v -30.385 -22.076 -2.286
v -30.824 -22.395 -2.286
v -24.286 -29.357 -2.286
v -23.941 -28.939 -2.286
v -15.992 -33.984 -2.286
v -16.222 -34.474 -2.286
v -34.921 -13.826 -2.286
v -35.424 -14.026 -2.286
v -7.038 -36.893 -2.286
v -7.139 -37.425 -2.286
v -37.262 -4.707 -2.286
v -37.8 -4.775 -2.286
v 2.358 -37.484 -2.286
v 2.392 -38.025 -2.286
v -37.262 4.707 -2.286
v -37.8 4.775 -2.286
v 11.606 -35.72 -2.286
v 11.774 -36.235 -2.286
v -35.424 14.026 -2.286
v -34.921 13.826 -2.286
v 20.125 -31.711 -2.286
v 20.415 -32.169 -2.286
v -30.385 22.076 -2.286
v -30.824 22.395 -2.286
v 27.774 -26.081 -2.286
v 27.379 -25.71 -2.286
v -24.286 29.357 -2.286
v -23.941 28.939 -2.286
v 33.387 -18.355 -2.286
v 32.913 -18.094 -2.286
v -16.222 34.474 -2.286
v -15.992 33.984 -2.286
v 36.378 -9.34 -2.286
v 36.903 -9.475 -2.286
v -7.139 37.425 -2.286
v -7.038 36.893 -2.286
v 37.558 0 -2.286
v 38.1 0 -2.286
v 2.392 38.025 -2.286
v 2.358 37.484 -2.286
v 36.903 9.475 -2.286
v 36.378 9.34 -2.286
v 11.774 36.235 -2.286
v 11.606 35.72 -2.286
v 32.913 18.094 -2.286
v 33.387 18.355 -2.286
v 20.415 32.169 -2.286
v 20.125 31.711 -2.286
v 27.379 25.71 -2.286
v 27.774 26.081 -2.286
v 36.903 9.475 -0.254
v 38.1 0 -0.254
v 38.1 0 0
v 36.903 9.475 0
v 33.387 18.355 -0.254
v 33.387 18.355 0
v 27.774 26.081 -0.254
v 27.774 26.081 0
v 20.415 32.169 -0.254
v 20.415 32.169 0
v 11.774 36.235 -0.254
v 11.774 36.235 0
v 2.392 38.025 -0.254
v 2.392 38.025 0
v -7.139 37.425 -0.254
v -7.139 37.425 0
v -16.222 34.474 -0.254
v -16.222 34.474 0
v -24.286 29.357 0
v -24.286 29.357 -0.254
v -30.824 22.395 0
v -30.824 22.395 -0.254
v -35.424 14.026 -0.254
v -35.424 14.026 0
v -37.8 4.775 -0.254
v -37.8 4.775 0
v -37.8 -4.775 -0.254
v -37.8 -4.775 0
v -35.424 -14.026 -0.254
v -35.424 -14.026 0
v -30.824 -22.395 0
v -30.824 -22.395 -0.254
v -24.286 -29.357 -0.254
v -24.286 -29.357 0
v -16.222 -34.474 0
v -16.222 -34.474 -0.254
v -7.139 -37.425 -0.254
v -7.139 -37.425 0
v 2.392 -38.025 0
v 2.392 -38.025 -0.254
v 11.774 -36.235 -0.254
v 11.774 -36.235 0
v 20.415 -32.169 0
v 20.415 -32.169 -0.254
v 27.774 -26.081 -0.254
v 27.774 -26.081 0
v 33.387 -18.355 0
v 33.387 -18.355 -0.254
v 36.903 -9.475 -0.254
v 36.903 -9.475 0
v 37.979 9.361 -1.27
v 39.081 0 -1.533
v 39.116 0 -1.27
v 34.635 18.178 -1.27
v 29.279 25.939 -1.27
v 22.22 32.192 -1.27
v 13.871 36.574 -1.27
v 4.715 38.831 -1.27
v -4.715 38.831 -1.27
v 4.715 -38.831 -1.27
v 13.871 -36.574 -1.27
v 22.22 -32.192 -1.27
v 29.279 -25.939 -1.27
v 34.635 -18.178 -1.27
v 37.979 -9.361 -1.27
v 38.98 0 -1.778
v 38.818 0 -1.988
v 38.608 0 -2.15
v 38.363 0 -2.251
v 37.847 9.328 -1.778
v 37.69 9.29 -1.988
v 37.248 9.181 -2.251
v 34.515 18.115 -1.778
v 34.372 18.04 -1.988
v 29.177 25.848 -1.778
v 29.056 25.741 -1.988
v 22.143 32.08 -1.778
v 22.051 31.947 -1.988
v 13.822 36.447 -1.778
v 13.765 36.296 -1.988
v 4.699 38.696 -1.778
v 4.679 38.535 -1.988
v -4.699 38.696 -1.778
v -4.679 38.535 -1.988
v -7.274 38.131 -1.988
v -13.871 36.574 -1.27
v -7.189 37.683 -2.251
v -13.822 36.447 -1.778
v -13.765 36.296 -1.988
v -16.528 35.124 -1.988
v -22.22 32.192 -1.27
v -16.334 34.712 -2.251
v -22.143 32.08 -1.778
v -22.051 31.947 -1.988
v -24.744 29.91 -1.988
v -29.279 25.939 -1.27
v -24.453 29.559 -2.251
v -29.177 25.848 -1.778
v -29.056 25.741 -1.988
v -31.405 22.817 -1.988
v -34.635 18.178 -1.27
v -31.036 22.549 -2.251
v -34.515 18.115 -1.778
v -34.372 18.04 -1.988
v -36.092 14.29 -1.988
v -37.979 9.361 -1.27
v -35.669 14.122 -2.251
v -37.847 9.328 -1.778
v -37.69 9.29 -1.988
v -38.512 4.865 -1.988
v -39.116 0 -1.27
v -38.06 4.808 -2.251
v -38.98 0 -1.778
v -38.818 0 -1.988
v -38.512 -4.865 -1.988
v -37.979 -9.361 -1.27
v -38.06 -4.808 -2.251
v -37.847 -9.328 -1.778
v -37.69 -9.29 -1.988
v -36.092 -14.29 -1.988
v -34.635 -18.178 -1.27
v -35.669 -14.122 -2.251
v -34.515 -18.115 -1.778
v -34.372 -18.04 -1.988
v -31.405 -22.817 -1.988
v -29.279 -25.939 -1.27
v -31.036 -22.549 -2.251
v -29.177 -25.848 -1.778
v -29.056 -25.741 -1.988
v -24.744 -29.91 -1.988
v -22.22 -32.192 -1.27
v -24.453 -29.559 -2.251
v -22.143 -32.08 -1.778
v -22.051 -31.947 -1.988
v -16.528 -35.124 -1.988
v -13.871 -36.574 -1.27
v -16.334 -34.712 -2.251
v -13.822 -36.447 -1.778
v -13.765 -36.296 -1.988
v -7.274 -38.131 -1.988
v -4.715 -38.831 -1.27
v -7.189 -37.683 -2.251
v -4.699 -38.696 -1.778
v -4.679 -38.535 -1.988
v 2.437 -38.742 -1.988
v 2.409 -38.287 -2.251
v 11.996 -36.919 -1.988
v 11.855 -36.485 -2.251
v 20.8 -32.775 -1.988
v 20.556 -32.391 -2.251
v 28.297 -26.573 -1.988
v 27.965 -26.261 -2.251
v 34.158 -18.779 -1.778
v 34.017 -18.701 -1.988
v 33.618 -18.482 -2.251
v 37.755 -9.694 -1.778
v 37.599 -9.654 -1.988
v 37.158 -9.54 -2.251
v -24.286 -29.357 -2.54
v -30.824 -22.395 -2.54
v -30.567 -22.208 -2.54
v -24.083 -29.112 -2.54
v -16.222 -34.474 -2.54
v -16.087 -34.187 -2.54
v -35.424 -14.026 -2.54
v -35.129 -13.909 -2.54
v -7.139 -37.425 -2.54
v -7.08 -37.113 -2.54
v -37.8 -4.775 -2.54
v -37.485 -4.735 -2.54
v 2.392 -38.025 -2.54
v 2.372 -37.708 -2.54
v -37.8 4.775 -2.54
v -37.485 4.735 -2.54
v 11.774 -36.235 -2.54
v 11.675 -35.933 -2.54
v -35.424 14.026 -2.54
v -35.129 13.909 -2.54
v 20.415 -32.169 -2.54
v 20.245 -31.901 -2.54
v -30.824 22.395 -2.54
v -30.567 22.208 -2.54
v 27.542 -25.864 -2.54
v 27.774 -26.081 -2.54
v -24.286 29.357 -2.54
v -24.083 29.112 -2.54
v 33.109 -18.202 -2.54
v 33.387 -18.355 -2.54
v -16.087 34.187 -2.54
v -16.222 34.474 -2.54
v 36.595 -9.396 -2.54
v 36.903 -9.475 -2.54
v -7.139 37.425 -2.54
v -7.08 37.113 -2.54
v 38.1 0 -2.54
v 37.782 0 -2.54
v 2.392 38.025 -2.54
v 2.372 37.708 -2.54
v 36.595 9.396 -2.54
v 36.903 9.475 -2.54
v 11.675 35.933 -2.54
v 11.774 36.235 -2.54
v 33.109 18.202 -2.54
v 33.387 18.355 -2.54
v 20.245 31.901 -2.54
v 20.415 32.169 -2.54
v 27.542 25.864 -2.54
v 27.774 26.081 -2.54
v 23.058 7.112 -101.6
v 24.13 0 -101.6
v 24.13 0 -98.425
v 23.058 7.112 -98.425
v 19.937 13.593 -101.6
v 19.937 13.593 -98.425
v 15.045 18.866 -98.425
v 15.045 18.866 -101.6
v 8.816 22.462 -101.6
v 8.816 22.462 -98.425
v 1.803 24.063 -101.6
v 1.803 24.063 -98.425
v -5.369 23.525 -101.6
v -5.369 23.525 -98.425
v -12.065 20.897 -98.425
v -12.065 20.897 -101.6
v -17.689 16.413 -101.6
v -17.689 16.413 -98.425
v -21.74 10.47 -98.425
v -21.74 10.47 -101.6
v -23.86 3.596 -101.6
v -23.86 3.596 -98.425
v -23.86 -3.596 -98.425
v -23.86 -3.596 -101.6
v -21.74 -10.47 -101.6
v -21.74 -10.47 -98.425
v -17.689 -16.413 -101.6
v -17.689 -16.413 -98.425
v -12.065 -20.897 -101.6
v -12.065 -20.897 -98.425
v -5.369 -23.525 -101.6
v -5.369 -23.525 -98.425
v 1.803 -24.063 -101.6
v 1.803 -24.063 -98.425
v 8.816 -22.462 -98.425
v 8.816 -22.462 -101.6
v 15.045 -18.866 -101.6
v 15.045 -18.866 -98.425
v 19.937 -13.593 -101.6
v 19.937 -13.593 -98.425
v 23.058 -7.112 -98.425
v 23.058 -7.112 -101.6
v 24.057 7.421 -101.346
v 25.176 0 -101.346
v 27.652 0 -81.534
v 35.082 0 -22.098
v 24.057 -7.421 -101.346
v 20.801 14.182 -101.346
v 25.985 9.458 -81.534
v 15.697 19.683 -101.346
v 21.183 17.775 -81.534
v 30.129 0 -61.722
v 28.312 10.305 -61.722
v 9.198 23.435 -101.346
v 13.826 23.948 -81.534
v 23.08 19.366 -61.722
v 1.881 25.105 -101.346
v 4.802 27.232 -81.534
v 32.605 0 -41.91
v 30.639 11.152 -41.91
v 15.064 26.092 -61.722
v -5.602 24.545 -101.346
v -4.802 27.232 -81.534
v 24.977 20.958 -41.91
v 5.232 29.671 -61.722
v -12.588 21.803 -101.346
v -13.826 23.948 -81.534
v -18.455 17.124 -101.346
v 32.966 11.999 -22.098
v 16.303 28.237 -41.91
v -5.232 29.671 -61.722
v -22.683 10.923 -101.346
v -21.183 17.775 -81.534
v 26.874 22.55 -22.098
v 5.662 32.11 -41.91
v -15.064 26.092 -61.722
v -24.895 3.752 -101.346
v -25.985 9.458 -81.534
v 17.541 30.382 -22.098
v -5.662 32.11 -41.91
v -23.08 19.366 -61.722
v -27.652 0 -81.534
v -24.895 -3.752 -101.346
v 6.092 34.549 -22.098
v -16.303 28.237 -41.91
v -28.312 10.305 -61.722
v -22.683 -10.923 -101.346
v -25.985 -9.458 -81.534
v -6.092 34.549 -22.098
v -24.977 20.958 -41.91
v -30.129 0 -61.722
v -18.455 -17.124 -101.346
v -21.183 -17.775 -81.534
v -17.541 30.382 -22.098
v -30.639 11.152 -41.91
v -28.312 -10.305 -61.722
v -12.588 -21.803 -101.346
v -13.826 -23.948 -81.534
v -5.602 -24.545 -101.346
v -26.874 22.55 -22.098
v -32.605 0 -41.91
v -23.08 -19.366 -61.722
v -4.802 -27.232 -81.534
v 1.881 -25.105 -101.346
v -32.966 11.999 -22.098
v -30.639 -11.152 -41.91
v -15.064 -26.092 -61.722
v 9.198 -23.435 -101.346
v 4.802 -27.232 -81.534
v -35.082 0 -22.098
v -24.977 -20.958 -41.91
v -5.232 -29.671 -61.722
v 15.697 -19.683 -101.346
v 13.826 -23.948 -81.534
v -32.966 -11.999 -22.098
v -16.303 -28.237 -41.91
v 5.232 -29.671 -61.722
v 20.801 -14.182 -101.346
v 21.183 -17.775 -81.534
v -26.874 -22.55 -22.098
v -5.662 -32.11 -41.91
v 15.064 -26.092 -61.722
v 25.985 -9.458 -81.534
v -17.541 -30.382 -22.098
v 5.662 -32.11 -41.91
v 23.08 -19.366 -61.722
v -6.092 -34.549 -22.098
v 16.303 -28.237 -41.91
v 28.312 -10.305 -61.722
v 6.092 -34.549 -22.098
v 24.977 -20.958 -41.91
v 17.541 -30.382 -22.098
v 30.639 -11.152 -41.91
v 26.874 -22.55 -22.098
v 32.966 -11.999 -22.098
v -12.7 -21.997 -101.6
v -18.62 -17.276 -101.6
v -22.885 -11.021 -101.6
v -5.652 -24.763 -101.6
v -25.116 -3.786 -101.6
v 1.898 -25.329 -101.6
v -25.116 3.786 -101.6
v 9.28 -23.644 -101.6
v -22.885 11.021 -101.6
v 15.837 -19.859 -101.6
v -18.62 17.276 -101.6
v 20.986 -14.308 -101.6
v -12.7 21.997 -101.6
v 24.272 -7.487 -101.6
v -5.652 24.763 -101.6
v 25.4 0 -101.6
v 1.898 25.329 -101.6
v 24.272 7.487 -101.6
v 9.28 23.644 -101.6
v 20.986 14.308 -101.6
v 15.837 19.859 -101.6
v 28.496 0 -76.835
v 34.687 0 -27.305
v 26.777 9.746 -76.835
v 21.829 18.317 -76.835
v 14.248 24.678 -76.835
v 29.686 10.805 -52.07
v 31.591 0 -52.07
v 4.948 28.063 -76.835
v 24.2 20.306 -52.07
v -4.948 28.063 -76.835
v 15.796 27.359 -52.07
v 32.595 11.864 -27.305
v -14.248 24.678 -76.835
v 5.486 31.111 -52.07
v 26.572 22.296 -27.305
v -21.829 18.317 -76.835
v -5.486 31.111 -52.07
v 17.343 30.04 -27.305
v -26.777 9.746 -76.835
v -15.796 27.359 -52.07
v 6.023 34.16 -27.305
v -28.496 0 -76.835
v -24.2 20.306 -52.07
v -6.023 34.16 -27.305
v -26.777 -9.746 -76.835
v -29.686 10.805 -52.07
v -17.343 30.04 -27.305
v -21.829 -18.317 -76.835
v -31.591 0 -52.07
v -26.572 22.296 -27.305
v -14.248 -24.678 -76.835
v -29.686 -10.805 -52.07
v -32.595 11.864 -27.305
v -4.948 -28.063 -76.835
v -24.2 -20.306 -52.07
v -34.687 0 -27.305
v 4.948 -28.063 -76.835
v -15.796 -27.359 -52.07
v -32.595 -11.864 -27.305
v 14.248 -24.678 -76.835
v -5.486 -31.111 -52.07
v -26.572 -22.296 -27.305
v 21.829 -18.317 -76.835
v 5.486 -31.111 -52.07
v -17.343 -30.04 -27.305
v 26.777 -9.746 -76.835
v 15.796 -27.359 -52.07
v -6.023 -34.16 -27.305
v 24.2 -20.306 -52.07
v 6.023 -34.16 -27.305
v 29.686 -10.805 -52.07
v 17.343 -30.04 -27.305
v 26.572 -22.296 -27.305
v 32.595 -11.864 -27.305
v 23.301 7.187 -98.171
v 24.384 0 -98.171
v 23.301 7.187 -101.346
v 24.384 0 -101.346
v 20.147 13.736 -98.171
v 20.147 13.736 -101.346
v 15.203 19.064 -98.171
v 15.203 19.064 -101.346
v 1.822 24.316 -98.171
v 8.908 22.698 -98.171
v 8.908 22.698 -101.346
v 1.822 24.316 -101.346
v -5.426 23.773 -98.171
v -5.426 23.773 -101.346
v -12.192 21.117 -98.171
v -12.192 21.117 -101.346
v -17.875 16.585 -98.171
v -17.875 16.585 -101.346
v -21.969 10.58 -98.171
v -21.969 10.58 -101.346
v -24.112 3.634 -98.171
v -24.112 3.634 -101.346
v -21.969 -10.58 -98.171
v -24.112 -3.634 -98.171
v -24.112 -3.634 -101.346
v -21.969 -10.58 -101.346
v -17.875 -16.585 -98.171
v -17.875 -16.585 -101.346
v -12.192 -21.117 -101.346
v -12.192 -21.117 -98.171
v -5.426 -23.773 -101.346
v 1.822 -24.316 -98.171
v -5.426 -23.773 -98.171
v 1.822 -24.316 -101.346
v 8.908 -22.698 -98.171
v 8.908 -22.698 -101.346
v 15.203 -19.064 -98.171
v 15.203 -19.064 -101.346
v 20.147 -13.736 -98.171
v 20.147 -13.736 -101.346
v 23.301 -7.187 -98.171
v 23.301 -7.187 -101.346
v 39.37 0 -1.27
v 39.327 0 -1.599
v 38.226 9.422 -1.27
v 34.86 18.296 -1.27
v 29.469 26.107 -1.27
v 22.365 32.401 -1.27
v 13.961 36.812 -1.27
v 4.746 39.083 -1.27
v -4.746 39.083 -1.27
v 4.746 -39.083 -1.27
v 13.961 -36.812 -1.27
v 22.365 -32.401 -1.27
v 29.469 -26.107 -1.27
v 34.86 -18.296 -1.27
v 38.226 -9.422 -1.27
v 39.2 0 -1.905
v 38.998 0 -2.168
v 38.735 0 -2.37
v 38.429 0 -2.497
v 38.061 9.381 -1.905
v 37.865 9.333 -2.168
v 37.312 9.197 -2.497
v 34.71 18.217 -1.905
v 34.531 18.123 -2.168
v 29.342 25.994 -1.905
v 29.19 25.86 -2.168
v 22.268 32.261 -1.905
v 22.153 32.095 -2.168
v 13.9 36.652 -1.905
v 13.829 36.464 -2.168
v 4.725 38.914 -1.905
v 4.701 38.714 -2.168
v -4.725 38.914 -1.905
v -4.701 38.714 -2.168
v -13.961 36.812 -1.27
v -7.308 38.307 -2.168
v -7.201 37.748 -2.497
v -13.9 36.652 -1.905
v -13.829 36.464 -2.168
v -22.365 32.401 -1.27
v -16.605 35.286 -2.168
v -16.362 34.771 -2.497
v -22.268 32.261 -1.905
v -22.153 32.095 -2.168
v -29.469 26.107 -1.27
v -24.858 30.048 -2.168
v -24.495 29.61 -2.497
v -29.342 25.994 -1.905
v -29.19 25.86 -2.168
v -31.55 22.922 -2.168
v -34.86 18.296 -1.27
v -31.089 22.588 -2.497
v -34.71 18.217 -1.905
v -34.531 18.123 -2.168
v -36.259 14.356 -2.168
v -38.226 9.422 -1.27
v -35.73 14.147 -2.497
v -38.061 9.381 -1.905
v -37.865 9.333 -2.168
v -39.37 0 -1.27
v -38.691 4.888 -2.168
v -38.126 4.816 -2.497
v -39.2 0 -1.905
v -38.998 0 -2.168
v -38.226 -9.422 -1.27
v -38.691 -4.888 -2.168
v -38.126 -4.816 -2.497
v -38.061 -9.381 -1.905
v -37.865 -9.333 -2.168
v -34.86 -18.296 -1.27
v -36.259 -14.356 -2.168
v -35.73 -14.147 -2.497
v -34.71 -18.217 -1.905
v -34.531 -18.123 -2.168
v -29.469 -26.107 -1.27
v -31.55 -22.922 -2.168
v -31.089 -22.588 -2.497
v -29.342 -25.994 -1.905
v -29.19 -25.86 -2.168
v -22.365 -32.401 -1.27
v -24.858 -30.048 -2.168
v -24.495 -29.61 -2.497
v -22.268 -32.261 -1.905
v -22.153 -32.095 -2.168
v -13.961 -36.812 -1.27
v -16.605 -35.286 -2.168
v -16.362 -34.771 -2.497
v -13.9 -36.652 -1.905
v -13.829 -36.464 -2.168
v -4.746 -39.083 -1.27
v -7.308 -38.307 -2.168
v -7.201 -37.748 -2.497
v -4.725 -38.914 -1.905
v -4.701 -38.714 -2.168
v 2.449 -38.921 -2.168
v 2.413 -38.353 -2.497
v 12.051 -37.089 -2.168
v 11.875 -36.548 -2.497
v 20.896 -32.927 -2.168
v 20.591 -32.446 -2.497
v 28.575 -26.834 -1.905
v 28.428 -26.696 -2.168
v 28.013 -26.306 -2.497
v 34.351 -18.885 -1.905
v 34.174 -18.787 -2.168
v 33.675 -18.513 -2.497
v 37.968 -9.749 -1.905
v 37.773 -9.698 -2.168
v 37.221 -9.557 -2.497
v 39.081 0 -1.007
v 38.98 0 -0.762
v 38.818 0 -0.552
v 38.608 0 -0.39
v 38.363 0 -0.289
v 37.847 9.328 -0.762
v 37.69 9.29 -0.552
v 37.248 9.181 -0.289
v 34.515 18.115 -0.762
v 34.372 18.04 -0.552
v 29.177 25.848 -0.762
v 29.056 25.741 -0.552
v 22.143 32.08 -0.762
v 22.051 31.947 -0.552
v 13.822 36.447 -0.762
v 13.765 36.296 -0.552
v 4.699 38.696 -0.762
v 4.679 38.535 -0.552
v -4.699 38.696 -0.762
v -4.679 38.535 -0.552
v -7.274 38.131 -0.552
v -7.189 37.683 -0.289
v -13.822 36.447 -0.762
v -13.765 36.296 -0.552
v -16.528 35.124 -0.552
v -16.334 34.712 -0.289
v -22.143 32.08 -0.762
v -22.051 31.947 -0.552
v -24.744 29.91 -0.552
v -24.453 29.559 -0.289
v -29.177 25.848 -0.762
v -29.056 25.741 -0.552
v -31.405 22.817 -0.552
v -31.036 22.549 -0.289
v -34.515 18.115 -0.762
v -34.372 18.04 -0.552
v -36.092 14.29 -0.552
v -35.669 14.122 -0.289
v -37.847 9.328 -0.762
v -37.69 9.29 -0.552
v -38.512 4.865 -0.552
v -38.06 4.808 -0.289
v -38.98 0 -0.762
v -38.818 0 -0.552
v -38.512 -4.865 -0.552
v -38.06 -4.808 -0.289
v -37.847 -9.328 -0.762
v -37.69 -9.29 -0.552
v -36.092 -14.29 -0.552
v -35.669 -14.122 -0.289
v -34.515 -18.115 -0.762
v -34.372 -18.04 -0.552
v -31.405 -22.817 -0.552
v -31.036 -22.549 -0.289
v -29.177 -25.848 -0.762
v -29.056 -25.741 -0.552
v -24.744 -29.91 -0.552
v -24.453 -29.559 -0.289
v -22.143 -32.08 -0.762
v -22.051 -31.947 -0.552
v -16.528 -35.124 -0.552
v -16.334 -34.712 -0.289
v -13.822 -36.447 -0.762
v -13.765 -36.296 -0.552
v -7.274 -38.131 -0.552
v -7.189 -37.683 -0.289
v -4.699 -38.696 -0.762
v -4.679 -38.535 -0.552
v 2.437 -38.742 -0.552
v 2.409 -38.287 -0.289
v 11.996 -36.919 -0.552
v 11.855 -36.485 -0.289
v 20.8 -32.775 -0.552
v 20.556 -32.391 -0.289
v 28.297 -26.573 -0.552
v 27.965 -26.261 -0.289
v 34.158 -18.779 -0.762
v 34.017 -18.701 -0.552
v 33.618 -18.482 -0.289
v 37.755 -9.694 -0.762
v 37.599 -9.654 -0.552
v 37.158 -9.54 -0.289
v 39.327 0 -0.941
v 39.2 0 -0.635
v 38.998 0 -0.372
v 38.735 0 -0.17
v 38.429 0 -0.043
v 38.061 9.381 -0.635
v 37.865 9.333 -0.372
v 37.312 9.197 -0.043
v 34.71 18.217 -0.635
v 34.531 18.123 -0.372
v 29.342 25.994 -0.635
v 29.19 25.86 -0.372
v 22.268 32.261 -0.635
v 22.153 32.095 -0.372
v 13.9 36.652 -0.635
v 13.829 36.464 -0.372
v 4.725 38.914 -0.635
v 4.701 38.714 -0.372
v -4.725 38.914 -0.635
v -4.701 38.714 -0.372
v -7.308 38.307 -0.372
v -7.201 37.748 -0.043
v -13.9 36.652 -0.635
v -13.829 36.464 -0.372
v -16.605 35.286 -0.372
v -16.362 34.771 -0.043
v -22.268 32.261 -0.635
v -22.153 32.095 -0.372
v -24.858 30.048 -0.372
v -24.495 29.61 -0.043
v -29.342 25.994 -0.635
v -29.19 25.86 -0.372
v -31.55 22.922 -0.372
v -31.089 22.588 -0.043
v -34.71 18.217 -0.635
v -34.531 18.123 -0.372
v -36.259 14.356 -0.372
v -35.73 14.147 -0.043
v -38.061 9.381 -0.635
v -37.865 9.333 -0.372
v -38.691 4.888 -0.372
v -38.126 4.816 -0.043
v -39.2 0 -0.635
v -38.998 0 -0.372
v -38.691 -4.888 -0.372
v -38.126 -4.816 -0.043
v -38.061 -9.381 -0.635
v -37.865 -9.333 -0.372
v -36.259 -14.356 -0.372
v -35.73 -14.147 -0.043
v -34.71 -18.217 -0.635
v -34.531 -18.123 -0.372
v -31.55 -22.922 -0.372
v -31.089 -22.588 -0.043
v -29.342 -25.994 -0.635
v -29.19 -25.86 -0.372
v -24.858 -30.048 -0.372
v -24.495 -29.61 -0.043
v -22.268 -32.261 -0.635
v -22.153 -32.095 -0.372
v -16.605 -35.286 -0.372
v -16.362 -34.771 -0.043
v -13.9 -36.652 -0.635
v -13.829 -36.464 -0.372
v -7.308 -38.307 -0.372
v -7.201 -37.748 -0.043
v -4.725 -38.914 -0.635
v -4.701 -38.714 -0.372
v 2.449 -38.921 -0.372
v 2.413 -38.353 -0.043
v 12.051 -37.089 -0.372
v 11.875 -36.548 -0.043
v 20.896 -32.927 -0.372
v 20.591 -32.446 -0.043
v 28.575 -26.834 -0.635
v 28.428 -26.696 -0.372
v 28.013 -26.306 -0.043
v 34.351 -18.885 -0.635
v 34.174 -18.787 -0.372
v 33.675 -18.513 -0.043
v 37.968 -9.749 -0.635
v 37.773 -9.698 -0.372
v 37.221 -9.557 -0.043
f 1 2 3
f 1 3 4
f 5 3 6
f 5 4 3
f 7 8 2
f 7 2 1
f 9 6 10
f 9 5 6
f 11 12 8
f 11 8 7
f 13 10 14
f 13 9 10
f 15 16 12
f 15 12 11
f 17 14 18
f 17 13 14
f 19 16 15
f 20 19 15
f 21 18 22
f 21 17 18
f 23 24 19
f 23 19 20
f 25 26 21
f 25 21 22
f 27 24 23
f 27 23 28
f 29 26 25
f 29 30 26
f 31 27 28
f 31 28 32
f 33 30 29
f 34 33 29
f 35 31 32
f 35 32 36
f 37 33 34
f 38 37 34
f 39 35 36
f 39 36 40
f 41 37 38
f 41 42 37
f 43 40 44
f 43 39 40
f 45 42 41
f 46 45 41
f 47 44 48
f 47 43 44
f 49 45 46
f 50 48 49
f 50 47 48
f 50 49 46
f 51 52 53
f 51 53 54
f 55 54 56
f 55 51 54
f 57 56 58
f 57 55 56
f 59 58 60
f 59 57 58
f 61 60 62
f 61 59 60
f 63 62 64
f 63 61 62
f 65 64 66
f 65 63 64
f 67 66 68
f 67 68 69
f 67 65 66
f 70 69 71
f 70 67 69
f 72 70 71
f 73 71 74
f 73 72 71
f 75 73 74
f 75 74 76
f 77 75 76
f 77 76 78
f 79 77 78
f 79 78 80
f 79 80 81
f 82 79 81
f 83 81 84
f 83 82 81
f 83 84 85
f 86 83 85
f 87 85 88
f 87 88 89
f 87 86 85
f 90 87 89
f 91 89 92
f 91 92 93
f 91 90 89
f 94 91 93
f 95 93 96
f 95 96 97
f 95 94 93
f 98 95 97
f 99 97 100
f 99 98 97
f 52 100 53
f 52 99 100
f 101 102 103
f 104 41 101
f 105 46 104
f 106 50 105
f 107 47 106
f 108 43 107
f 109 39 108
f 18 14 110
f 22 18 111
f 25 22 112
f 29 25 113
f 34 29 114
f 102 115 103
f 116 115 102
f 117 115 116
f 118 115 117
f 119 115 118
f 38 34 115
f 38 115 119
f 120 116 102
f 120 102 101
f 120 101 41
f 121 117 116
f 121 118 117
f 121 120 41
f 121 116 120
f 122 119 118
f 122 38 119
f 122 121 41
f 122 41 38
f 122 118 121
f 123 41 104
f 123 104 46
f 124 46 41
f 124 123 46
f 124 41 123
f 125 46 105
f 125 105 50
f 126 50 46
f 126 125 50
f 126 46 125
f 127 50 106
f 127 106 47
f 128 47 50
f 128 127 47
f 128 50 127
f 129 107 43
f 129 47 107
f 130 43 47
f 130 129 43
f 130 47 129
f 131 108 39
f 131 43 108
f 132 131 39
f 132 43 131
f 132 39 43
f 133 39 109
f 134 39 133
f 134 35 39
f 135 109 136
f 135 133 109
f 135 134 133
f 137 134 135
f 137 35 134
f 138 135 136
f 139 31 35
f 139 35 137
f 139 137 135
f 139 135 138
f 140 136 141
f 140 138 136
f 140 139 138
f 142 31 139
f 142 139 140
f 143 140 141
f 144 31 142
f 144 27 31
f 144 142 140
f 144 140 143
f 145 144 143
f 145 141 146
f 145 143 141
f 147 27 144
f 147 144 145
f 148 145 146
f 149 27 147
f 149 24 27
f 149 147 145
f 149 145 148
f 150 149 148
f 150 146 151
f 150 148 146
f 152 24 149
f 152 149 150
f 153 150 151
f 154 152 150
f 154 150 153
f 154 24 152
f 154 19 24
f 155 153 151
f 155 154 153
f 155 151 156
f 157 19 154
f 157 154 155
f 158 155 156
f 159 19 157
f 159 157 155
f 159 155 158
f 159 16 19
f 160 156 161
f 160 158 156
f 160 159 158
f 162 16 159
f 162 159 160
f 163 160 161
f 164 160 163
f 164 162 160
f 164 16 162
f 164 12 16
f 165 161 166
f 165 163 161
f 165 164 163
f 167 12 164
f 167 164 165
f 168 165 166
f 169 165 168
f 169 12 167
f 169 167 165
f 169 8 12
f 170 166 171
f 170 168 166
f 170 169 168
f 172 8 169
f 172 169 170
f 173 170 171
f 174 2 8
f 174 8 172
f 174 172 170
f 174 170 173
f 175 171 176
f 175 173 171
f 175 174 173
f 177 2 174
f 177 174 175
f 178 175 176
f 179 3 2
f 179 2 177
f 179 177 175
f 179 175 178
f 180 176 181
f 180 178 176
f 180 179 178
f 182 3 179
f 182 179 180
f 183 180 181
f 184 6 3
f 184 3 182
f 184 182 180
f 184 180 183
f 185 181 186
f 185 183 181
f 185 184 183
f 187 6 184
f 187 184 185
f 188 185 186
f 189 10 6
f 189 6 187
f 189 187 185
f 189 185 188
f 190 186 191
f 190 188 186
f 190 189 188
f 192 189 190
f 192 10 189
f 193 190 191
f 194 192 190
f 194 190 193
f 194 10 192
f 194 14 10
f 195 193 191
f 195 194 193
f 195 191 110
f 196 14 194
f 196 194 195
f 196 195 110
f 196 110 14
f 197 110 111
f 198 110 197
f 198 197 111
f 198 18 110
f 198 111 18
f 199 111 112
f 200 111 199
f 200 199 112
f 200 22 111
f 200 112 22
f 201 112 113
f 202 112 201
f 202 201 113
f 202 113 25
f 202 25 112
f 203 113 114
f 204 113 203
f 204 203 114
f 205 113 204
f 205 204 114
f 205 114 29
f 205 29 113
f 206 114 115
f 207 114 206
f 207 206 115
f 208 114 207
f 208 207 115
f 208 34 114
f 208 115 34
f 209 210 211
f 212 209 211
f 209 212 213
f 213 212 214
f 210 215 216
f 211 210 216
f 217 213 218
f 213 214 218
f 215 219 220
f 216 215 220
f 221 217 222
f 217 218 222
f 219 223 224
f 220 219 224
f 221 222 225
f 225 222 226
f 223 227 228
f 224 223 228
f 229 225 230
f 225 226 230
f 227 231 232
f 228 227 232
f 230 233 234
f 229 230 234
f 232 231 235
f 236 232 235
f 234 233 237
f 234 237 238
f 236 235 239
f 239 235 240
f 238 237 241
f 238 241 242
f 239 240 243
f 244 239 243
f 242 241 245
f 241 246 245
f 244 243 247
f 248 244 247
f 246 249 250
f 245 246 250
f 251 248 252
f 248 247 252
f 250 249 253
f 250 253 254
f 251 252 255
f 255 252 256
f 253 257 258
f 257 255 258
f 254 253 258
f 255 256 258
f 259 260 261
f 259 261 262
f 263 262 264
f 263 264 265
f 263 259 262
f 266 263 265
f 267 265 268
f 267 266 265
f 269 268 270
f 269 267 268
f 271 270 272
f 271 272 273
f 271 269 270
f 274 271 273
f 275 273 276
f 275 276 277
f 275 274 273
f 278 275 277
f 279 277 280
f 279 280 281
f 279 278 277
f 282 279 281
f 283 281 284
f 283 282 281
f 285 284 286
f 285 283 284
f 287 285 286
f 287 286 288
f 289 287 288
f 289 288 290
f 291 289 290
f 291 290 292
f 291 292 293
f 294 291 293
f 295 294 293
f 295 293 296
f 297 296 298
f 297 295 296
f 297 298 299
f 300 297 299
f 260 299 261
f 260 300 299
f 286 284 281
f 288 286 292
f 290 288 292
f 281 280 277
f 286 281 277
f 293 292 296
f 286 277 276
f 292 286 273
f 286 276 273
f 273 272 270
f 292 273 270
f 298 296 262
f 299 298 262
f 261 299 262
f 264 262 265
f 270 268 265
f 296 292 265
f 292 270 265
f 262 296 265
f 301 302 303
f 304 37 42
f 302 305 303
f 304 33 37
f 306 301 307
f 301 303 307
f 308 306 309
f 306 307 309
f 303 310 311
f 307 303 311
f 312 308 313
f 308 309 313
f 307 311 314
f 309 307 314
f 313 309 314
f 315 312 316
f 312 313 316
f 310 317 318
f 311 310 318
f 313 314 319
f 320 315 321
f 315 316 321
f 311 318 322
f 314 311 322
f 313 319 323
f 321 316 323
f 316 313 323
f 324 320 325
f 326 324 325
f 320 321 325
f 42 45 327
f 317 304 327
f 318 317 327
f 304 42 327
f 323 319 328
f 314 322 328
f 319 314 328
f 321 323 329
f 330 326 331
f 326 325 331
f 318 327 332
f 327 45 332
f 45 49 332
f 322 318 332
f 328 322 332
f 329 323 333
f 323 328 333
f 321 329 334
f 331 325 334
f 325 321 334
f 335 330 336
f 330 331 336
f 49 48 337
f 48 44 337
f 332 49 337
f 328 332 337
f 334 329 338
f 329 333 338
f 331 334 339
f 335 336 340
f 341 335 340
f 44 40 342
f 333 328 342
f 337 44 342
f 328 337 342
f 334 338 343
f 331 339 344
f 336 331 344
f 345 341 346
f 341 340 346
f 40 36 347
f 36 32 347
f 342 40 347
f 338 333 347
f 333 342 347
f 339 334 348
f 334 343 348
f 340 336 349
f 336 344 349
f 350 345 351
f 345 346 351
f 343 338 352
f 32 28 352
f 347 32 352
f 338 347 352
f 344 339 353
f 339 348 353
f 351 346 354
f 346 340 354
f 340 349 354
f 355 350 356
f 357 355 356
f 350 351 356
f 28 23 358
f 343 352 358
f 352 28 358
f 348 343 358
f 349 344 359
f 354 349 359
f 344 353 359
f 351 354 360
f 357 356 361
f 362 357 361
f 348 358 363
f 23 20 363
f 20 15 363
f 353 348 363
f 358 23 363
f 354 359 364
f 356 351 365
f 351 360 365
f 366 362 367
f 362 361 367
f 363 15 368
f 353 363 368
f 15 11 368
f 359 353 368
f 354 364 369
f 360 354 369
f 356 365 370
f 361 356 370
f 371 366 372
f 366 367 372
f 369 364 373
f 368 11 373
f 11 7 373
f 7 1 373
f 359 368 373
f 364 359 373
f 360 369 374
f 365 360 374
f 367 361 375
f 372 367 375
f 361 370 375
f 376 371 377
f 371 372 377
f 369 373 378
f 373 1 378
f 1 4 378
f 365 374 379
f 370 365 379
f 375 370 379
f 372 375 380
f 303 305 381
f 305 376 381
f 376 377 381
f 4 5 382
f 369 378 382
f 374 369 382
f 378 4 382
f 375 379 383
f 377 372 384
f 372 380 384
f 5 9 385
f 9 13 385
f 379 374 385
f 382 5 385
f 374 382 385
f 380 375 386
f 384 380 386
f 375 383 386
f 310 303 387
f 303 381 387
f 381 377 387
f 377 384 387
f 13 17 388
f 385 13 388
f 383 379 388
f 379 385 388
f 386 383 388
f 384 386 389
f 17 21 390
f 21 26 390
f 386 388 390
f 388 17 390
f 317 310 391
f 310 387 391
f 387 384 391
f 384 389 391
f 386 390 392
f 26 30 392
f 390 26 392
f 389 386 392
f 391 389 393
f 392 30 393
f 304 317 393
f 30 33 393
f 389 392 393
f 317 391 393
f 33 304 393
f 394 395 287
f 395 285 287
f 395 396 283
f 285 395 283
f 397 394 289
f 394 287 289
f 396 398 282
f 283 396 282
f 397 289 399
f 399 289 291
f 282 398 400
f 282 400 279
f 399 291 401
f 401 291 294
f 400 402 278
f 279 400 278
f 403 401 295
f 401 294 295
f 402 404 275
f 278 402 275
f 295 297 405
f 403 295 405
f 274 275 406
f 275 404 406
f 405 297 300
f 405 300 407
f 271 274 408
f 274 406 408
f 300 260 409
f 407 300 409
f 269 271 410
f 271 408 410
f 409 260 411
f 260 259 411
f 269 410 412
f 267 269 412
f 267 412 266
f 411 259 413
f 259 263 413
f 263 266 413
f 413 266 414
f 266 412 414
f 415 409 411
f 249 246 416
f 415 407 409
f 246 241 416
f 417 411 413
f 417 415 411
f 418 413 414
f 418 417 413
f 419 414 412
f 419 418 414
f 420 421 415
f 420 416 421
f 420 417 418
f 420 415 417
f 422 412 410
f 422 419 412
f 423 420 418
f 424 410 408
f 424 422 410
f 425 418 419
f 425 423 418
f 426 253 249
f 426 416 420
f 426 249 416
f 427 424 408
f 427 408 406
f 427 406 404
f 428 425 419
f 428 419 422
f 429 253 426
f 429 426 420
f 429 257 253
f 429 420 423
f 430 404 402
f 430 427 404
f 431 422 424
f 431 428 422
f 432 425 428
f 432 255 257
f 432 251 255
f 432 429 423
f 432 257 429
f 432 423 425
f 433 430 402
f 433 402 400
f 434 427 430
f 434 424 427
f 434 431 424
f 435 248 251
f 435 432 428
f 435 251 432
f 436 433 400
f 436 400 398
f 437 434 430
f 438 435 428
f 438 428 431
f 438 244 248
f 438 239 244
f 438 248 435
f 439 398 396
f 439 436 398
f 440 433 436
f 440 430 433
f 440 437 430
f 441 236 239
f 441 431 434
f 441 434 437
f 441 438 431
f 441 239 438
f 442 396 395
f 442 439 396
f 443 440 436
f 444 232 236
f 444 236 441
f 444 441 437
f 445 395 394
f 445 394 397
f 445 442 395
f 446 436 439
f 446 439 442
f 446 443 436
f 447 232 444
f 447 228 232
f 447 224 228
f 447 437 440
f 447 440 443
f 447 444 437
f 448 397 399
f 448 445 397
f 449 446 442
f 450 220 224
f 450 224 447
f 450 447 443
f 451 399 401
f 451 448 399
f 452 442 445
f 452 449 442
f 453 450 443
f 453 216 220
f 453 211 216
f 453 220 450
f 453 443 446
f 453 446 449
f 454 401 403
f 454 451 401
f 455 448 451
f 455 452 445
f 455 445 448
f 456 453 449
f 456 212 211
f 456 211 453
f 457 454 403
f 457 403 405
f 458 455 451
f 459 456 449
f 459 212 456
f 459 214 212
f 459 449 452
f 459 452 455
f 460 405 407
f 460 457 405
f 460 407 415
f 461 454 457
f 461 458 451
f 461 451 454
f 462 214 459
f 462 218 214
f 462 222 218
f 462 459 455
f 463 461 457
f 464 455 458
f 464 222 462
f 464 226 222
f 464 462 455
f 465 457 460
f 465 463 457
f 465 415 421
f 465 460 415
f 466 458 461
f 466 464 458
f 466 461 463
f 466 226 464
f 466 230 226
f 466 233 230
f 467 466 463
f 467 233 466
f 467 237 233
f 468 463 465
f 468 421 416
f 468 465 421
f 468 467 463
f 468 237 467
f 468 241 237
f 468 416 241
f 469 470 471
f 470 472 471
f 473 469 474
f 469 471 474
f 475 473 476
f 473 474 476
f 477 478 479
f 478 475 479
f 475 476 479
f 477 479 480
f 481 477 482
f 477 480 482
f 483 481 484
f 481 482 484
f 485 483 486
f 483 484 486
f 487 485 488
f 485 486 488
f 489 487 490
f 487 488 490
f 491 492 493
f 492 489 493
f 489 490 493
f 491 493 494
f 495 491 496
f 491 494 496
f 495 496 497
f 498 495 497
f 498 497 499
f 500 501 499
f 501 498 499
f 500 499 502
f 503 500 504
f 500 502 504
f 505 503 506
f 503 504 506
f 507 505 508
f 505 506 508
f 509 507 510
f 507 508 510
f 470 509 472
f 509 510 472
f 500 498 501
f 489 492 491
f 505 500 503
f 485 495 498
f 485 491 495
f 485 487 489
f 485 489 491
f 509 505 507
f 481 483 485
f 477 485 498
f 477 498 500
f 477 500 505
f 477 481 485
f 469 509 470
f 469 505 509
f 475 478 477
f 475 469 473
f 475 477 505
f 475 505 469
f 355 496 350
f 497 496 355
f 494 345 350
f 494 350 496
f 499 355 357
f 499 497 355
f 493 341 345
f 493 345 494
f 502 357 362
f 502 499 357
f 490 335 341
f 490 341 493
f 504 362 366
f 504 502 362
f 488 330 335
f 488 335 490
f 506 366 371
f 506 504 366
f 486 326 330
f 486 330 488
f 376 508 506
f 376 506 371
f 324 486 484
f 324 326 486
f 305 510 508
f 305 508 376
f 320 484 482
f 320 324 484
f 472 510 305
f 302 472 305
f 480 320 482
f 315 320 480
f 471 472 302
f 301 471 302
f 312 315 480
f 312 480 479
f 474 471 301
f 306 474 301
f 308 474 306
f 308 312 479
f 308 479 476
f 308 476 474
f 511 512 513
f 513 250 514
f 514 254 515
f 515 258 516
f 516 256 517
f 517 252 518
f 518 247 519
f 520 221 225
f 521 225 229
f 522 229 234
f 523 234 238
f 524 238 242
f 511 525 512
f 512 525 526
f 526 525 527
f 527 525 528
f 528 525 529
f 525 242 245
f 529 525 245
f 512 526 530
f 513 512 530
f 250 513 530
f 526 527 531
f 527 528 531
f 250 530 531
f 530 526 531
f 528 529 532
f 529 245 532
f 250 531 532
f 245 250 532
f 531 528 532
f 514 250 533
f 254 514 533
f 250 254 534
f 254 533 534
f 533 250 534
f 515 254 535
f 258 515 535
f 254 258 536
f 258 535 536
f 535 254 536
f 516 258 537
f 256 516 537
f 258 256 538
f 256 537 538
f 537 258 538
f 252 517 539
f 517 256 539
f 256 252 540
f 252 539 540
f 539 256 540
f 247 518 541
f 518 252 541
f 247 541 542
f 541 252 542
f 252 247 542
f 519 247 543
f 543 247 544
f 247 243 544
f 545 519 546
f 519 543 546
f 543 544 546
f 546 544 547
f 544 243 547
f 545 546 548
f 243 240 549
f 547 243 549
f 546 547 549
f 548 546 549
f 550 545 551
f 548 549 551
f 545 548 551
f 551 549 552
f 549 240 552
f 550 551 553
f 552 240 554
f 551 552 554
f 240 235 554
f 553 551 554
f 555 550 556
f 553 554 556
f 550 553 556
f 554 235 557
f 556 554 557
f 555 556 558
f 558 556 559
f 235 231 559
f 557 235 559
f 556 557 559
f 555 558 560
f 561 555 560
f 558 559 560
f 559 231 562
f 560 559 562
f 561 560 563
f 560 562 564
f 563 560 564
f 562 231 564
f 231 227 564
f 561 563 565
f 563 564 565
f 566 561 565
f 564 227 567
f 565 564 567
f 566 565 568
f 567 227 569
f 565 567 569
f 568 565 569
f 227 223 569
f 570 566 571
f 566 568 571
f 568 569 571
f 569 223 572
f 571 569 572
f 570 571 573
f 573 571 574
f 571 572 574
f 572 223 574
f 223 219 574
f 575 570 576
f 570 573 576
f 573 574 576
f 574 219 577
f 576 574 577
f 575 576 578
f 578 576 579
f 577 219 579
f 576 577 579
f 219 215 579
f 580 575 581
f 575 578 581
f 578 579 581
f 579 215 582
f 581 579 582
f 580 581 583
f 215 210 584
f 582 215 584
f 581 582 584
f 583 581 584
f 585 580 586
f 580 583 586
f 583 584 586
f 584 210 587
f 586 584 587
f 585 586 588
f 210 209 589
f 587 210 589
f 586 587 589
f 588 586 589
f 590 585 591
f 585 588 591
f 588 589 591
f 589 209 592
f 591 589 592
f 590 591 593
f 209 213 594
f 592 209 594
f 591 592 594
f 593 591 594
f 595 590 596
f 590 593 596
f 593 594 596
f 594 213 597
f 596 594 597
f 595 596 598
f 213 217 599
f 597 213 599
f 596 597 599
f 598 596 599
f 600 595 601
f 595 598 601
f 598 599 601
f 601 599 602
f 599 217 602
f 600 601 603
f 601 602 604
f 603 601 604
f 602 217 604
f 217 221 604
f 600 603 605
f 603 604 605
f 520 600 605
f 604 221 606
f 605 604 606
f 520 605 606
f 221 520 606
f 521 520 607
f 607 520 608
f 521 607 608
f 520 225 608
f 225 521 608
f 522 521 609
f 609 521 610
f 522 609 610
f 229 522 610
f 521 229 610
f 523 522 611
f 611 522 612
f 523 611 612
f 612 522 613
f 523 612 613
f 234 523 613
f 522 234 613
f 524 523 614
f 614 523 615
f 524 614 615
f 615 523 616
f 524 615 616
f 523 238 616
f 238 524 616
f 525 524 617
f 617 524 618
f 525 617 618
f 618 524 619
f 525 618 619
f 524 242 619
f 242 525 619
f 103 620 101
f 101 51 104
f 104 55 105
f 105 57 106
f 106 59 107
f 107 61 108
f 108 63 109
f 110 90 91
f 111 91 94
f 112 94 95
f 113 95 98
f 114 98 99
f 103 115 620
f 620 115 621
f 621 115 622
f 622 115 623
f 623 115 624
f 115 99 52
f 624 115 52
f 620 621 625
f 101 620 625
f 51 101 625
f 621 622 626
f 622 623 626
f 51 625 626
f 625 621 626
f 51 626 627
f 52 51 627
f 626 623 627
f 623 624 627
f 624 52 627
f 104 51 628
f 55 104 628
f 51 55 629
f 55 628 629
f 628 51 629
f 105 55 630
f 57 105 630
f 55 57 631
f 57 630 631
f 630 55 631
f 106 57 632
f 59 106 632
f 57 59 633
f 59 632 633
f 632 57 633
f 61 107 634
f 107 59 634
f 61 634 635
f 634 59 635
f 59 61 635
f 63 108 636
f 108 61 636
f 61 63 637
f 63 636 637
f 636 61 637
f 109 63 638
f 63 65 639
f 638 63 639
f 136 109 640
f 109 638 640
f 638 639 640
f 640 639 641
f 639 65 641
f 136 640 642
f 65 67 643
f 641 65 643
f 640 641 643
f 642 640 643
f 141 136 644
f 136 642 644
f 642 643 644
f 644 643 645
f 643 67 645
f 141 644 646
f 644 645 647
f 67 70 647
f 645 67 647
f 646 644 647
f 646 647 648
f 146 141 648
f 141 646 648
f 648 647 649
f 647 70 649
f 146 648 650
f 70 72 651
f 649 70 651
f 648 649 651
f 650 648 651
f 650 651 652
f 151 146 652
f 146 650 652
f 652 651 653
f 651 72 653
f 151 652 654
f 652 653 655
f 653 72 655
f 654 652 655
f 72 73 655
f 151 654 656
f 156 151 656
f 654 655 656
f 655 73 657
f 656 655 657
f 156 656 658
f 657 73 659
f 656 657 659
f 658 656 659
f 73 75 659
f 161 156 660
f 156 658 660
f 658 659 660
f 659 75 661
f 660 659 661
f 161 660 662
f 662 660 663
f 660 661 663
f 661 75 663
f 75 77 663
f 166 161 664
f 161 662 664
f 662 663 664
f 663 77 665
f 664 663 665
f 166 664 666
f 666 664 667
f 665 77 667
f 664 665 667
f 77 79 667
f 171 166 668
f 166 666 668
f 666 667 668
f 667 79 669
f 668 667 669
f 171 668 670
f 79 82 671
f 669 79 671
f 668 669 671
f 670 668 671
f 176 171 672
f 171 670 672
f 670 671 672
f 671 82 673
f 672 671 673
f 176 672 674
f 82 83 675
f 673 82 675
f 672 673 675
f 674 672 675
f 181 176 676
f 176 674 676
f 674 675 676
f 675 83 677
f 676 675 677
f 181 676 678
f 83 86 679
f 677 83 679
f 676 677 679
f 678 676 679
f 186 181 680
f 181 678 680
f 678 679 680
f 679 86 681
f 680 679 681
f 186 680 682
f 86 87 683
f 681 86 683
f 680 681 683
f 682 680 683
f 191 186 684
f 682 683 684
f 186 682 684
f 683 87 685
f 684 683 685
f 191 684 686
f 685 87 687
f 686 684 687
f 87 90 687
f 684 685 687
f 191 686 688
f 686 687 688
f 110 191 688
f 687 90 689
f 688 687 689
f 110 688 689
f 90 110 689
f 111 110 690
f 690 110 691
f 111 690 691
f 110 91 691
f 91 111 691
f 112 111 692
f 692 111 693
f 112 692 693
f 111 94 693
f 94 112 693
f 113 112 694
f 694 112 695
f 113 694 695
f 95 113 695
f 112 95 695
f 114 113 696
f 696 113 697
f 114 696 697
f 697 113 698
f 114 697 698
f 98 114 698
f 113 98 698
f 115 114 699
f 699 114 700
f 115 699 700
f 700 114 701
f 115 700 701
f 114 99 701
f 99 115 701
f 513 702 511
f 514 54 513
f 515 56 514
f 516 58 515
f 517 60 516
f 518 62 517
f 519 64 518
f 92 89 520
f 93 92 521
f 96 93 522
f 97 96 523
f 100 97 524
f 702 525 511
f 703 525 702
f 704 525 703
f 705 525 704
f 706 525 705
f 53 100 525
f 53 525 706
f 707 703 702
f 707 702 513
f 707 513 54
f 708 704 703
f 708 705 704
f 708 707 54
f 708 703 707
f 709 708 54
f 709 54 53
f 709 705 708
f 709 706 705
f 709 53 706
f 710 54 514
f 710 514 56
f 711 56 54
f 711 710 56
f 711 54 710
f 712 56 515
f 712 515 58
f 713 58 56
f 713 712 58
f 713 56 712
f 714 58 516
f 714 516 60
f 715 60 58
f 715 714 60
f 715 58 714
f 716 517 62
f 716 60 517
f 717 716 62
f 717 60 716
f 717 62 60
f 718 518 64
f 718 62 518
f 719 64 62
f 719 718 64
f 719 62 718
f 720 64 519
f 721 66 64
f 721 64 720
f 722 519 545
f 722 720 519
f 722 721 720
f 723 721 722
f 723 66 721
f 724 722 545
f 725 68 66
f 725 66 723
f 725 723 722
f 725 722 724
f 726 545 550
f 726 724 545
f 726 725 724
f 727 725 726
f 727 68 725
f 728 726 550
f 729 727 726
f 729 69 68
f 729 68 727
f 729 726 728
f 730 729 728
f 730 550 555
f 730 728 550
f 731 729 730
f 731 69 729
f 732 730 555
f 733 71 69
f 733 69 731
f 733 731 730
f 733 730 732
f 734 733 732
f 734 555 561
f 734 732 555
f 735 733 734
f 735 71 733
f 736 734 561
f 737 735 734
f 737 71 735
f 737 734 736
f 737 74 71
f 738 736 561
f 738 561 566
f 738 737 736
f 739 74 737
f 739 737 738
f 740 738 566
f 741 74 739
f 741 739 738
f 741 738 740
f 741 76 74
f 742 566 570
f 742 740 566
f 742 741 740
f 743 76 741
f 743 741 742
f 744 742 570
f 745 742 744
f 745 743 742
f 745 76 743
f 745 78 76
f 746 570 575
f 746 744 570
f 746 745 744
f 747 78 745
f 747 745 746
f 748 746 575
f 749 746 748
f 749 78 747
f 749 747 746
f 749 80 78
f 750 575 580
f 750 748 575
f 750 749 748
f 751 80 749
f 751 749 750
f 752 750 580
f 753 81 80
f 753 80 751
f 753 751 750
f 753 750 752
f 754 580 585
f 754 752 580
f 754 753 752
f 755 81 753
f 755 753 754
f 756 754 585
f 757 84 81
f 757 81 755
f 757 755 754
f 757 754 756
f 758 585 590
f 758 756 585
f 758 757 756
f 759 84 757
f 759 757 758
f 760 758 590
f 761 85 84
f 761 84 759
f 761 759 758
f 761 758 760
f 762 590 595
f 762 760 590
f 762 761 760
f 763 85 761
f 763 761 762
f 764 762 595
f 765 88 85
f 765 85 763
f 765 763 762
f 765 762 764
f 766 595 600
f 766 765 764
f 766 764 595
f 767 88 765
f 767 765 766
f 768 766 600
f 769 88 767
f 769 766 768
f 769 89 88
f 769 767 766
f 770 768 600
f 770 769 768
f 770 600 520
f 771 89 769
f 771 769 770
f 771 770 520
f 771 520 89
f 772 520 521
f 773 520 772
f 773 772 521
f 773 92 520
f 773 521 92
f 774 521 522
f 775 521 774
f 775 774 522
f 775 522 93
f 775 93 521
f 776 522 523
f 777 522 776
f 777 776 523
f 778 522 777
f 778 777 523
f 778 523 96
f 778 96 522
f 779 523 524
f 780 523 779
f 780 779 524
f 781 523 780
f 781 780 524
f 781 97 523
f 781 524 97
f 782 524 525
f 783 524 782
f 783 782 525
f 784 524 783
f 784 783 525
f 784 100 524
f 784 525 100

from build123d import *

# Parameters (mm, degrees)
F2_R     = 25.4
F0_R     = 38.1
F3_R     = 24.13
F5_DEPTH = 3.175
F6_R     = 39.37
F7_DEPTH = 2.54
F8_R     = 1.26999
F9_T     = -0.254


# Not quite as in the source:
# - a fillet or chamfer is up to 0.001 mm smaller than in the source, because OpenCascade refuses the exact size
# - a shell that OpenCascade refuses in one call is made with other operations: the cavity is built on its own and cut out


with BuildPart() as f4:
    # F2 (on offset) → F4 section 0
    with BuildSketch(Plane.XY.offset(-101.6)):
        Circle(F2_R)
    # F0 (on Top) → F4 section 1
    with BuildSketch(Plane.XY):
        Circle(F0_R)
    loft()

    # F3 (on offset) → F5 (cut)
    with BuildSketch(Plane.XY.offset(-101.6)):
        Circle(F3_R)
    extrude(amount=F5_DEPTH, mode=Mode.SUBTRACT)

    # F6 (on Top) → F7 (join)
    with BuildSketch(Plane.XY):
        Circle(F6_R)
    extrude(amount=-F7_DEPTH)

    # F8 (radius 1.27 in the source; OpenCascade refuses exactly that, so slightly less here)
    f8_edges = [f4.edges().sort_by_distance(p)[0] for p in [
        (-39.37, 0, -2.54),
        (-39.37, 0, 0),
    ]]
    fillet(f8_edges, radius=F8_R)

    # F9: a shell. OpenCascade refuses it in one call, so the cavity is built on its own and cut out:
    # the body offset inwards by the wall thickness, plus a prism from it out through each open face.
    f9_core = offset(f4.part, amount=F9_T, kind=Kind.INTERSECTION, mode=Mode.PRIVATE)
    f9_exits = [f9_core.faces().sort_by_distance(p)[0] for p in [
        (0, 0, -0.254),
    ]]
    add(f9_core, mode=Mode.SUBTRACT)
    extrude(f9_exits, amount=-F9_T, mode=Mode.SUBTRACT)


solid = f4.part
